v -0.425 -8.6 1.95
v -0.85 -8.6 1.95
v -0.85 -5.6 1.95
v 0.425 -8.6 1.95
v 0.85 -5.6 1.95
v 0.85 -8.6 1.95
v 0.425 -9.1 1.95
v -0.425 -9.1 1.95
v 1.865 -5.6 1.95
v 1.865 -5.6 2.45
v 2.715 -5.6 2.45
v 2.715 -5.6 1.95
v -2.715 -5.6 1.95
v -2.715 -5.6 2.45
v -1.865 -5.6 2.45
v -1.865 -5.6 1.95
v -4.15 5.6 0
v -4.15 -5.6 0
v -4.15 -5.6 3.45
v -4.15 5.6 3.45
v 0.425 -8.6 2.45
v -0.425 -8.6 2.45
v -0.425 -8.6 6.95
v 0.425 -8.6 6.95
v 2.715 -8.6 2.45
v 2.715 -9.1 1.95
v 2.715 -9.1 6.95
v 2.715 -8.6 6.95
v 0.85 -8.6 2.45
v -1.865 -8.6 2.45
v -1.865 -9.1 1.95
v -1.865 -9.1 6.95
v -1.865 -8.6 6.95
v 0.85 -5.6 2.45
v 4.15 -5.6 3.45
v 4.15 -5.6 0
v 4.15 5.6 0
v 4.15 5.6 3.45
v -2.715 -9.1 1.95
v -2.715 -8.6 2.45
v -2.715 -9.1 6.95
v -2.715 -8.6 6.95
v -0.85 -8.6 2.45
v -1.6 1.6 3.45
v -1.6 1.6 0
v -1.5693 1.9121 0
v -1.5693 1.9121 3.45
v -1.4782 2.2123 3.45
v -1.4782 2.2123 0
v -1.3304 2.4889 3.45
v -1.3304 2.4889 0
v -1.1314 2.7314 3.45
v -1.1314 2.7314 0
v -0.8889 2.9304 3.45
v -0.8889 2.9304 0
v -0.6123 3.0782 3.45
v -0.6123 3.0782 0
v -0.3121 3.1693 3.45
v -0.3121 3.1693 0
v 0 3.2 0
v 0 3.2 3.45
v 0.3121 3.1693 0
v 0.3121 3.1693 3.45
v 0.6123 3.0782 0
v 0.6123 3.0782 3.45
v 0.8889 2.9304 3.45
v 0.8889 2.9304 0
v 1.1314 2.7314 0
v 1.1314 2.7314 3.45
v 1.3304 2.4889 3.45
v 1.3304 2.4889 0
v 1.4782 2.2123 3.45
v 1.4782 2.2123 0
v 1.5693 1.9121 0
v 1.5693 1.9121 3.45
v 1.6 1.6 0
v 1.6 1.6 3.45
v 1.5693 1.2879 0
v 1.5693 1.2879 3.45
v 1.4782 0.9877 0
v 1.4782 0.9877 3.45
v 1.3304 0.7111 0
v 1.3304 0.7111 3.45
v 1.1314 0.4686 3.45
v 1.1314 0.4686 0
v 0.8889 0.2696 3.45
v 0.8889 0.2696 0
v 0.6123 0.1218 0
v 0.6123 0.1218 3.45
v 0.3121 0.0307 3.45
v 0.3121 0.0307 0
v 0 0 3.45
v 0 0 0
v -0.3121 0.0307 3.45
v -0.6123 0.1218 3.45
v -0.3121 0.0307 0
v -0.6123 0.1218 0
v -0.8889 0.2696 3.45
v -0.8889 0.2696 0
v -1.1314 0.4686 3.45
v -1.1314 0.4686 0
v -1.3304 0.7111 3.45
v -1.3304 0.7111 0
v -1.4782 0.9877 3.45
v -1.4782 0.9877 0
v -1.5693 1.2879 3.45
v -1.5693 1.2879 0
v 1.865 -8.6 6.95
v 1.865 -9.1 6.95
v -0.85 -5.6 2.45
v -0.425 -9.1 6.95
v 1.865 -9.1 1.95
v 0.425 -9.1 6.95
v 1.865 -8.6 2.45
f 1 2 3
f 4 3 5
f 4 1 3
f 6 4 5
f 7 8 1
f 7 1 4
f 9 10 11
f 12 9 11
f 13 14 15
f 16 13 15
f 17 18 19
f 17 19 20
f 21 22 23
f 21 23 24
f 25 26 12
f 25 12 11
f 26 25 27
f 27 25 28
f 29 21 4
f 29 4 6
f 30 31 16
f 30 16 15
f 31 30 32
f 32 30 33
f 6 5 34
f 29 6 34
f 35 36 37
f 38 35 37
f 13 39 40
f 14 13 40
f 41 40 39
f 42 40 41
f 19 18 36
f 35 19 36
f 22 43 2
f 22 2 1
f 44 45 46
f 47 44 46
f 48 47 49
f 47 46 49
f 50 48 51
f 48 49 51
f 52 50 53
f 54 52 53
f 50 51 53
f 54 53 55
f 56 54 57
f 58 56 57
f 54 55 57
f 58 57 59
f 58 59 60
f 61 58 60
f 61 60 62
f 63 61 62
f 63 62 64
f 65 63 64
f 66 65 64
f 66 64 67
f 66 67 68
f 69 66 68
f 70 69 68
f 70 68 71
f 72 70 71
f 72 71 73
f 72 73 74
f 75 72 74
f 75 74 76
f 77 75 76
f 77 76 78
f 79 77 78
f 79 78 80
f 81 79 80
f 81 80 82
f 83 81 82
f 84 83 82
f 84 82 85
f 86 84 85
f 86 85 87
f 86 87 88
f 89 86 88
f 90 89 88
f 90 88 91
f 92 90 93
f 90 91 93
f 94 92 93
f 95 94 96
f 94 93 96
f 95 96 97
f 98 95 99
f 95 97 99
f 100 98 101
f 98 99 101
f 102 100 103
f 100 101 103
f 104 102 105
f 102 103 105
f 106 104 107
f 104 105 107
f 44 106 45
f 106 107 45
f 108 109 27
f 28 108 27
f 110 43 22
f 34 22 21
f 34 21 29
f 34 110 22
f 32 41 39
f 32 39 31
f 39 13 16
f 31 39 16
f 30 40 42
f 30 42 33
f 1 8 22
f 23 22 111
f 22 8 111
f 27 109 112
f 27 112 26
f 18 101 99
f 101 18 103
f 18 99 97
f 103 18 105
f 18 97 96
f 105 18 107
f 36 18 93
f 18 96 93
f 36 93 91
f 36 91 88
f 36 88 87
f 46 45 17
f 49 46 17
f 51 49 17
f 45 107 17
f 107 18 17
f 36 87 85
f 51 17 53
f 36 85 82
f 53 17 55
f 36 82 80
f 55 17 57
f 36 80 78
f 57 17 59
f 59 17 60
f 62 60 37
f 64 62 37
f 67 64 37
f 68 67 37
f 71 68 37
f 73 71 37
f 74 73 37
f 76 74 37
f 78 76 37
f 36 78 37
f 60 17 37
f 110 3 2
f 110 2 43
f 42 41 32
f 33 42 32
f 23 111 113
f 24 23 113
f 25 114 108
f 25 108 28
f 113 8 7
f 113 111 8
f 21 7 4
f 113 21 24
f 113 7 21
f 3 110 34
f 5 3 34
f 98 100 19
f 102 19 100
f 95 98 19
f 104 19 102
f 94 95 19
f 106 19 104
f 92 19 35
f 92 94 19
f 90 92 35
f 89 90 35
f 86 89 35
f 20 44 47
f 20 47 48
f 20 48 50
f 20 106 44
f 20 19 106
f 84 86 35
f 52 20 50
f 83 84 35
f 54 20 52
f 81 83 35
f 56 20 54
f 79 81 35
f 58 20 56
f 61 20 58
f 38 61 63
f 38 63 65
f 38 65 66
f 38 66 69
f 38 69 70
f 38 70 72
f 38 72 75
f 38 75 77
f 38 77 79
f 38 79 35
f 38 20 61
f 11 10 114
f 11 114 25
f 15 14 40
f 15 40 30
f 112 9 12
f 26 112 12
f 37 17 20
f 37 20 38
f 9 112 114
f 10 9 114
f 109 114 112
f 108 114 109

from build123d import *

# Parameters (mm, degrees)
F0_W     = 8.3
F0_H     = 11.2
F1_DEPTH = 3.45
F3_D     = 3.2
F4_W     = 0.85
F4_H     = 0.5
F4_W_2   = 1.7
F5_DEPTH = 3.5
F6_W     = 0.85
F6_H     = 0.5
F7_DEPTH = 5
F8_W     = 0.425
F8_H     = 0.5
F9_DEPTH = 0.5


with BuildPart() as f1:
    # F0 (on Top) → F1 (new body)
    with BuildSketch(Plane.XY):
        Rectangle(F0_W, F0_H)
    extrude(amount=F1_DEPTH)

    # F3 (through all)
    with Locations(Plane.XY.offset(3.45)):
        with Locations((0, 1.6)):
            Hole(F3_D / 2)


with BuildPart() as f5:
    # F4 (on face) → F5 (new body)
    with BuildSketch(Plane.XZ.offset(5.6)):
        with Locations((-2.29, 2.2)):
            Rectangle(F4_W, F4_H)
        with Locations((0, 2.2)):
            Rectangle(F4_W_2, F4_H)
        with Locations((2.29, 2.2)):
            Rectangle(F4_W, F4_H)
    extrude(amount=F5_DEPTH)

    # F6 (on face) → F7 (join)
    with BuildSketch(Plane(origin=(0, 0, 1.95), x_dir=(1, 0, 0), z_dir=(0, 0, -1))):
        with Locations((2.29, 8.85)):
            Rectangle(F6_W, F6_H)
        with Locations((0, 8.85)):
            Rectangle(F6_W, F6_H)
        with Locations((-2.29, 8.85)):
            Rectangle(F6_W, F6_H)
    extrude(amount=-F7_DEPTH)

    # F8 (on face) → F9 (cut)
    with BuildSketch(Plane.XZ.offset(9.1)):
        with Locations((-0.6375, 2.2)):
            Rectangle(F8_W, F8_H)
        with Locations((0.6375, 2.2)):
            Rectangle(F8_W, F8_H)
    extrude(amount=-F9_DEPTH, mode=Mode.SUBTRACT)


solid = Compound([f1.part, f5.part])
